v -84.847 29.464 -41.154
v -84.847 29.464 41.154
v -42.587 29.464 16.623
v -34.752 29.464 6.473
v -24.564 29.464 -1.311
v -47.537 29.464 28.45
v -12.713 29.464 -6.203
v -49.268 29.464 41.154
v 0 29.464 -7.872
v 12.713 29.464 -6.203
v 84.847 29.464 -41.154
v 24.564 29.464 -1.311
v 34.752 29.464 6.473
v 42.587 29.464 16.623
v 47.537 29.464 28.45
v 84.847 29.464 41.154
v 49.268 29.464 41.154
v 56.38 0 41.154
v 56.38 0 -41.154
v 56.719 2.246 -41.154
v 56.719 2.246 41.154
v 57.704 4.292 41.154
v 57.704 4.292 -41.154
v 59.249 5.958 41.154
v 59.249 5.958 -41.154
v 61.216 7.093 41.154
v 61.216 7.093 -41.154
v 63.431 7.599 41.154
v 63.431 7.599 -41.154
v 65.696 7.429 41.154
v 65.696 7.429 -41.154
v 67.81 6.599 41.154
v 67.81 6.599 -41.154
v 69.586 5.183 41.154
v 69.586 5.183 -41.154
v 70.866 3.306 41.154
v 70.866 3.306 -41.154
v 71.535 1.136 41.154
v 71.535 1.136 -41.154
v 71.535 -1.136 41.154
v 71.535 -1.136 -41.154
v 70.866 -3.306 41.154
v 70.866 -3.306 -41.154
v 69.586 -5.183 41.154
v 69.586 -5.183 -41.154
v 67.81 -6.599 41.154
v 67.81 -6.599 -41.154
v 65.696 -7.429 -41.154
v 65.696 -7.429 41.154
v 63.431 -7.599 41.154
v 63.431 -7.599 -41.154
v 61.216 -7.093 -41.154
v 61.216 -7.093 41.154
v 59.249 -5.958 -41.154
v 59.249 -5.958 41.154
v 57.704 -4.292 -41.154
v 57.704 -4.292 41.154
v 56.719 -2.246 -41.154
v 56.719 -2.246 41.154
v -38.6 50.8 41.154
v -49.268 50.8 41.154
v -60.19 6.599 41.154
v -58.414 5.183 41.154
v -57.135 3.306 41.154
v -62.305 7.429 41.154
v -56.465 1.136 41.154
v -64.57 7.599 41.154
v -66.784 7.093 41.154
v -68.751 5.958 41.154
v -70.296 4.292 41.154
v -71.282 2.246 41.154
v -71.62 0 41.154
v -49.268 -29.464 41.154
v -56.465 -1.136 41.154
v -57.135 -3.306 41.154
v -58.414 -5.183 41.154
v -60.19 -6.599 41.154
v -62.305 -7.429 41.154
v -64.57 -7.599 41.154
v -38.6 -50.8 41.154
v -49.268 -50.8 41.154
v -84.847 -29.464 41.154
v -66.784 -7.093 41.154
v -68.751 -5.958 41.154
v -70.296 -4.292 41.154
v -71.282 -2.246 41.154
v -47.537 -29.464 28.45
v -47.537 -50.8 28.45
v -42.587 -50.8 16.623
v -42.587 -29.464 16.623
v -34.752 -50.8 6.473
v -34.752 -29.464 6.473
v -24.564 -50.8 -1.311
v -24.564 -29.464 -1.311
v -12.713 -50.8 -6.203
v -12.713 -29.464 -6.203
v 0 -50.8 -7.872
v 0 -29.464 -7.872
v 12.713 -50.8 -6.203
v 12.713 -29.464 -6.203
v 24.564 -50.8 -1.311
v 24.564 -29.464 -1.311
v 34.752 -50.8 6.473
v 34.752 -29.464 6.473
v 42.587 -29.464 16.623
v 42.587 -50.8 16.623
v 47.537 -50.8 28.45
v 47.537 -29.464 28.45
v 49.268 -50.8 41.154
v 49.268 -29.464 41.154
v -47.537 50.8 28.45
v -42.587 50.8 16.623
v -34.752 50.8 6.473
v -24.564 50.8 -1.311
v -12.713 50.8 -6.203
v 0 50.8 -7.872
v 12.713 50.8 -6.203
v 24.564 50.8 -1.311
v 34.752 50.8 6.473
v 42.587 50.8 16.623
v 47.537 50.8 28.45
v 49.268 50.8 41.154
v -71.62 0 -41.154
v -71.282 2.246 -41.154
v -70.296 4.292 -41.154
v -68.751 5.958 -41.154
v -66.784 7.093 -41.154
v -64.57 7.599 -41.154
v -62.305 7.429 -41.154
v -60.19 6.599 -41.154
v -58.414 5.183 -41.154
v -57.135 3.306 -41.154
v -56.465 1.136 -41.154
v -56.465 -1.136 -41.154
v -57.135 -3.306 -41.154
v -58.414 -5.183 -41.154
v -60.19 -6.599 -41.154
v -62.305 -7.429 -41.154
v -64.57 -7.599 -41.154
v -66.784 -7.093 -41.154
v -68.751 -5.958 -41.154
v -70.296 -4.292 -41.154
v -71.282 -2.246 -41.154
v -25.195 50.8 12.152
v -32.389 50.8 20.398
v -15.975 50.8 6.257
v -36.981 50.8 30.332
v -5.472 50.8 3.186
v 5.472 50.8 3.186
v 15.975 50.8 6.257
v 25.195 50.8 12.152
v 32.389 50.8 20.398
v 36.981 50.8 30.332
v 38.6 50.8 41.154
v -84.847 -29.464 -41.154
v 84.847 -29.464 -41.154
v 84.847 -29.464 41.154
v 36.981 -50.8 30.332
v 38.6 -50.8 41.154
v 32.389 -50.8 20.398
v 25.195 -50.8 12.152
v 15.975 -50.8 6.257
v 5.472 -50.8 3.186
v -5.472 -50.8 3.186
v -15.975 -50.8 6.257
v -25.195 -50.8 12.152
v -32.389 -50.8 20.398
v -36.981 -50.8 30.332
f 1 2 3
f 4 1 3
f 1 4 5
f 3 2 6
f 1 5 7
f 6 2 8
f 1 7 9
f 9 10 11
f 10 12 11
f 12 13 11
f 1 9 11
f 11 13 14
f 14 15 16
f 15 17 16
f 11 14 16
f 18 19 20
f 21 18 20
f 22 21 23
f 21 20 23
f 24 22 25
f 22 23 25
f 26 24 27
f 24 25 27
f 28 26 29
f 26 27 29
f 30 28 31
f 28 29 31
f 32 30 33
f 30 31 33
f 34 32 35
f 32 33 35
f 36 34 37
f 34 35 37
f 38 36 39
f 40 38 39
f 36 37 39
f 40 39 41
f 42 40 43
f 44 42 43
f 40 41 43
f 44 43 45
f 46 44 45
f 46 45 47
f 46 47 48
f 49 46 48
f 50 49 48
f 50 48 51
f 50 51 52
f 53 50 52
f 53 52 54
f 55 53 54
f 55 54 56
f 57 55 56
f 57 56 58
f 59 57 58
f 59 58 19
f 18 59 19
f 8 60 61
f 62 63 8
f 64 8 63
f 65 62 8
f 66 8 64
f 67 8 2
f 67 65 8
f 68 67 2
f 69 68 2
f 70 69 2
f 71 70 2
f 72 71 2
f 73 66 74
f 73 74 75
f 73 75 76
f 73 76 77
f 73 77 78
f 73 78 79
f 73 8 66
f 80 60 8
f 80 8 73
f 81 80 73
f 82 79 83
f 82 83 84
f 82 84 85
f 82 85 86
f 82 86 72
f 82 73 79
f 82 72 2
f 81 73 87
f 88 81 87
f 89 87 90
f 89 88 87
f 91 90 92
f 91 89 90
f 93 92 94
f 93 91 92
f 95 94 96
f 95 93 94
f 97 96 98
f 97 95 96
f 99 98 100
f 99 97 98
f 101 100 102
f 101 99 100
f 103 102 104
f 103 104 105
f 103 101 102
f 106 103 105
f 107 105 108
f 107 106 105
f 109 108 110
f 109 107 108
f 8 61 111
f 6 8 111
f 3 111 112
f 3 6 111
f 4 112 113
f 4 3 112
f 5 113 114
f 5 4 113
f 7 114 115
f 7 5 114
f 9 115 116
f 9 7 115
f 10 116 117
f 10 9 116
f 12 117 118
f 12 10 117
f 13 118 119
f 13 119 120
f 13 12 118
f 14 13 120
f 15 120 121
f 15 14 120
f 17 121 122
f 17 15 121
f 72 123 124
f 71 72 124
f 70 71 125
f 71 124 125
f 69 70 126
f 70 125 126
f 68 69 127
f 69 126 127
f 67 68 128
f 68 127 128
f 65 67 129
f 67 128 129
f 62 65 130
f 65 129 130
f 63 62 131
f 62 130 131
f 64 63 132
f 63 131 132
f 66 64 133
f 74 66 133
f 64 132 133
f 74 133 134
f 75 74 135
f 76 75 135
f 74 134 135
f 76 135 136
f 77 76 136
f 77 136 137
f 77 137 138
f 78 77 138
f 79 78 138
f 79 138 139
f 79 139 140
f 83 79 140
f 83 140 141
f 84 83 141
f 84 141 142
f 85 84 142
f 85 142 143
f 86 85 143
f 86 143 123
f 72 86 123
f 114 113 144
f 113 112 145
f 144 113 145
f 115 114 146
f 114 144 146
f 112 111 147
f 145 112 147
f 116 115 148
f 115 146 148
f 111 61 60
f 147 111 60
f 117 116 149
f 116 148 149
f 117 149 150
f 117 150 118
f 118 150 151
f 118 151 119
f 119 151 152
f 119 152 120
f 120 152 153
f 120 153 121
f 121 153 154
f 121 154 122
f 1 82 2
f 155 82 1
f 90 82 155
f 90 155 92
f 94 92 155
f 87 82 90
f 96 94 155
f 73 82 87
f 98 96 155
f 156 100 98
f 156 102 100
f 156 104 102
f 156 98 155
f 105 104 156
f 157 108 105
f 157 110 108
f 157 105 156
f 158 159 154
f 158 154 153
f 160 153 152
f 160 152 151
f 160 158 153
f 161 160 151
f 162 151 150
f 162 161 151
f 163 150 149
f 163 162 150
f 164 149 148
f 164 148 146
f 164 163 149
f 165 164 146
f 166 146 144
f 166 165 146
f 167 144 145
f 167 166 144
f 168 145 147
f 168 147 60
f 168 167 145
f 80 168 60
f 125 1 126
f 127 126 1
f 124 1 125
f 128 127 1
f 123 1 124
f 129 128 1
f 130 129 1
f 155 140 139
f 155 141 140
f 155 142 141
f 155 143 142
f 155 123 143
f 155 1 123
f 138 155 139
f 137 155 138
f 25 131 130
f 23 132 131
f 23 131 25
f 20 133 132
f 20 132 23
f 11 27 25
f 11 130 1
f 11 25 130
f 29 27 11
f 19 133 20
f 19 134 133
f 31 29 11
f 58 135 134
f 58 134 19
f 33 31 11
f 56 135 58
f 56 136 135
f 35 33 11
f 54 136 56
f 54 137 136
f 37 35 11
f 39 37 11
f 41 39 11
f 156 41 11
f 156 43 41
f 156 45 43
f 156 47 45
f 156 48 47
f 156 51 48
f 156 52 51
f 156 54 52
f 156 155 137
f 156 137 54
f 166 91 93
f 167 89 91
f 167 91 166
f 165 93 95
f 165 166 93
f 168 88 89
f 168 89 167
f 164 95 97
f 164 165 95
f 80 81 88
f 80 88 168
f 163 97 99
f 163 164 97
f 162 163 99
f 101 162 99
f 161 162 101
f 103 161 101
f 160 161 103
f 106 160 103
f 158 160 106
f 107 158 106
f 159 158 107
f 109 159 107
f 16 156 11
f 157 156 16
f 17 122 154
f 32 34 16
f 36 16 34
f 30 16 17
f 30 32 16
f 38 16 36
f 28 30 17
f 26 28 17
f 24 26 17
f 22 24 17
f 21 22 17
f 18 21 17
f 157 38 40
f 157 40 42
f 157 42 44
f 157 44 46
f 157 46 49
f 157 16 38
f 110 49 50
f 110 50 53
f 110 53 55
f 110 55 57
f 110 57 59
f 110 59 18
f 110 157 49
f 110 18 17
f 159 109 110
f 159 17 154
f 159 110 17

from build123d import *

# Parameters (mm, degrees)
F1_DEPTH = 50.8
F2_DEPTH = 29.464
F5_D     = 15.24
F6_D     = 15.24


with BuildPart() as f1:
    # F0 (on Front) → F1 (new body, symmetric)
    with BuildSketch(Plane.XZ):
        with BuildLine():
            ThreePointArc((-49.268454, 41.154392), (0, -7.871612), (49.268454, 41.154392))
            Line((49.268454, 41.154392), (38.600289, 41.154392))
            ThreePointArc((38.600289, 41.154392), (0, 2.796388), (-38.600289, 41.154392))
            Line((-38.600289, 41.154392), (-49.268454, 41.154392))
        make_face()
    extrude(amount=F1_DEPTH, both=True)

    # F0 (on Front) → F2 (join, symmetric)
    with BuildSketch(Plane.XZ):
        with BuildLine():
            Line((-84.846668, -41.154392), (84.846668, -41.154392))
            Line((84.846668, -41.154392), (84.846668, 41.154392))
            Line((84.846668, 41.154392), (49.268454, 41.154392))
            ThreePointArc((49.268454, 41.154392), (0, -7.871612), (-49.268454, 41.154392))
            Line((-49.268454, 41.154392), (-84.846668, 41.154392))
            Line((-84.846668, 41.154392), (-84.846668, -41.154392))
        make_face()
        with BuildLine():
            ThreePointArc((-49.268454, 41.154392), (0, -7.871612), (49.268454, 41.154392))
            Line((49.268454, 41.154392), (38.600289, 41.154392))
            ThreePointArc((38.600289, 41.154392), (0, 2.796388), (-38.600289, 41.154392))
            Line((-38.600289, 41.154392), (-49.268454, 41.154392))
        make_face()
    extrude(amount=F2_DEPTH, both=True)

    # F5 (through all)
    with Locations(Plane.XY.offset(41.154392)):
        with Locations((-64.000289, 0)):
            Hole(F5_D / 2)

    # F6 (through all)
    with Locations(Plane.XY.offset(41.154392)):
        with Locations((64.000289, 0)):
            Hole(F6_D / 2)


solid = f1.part
